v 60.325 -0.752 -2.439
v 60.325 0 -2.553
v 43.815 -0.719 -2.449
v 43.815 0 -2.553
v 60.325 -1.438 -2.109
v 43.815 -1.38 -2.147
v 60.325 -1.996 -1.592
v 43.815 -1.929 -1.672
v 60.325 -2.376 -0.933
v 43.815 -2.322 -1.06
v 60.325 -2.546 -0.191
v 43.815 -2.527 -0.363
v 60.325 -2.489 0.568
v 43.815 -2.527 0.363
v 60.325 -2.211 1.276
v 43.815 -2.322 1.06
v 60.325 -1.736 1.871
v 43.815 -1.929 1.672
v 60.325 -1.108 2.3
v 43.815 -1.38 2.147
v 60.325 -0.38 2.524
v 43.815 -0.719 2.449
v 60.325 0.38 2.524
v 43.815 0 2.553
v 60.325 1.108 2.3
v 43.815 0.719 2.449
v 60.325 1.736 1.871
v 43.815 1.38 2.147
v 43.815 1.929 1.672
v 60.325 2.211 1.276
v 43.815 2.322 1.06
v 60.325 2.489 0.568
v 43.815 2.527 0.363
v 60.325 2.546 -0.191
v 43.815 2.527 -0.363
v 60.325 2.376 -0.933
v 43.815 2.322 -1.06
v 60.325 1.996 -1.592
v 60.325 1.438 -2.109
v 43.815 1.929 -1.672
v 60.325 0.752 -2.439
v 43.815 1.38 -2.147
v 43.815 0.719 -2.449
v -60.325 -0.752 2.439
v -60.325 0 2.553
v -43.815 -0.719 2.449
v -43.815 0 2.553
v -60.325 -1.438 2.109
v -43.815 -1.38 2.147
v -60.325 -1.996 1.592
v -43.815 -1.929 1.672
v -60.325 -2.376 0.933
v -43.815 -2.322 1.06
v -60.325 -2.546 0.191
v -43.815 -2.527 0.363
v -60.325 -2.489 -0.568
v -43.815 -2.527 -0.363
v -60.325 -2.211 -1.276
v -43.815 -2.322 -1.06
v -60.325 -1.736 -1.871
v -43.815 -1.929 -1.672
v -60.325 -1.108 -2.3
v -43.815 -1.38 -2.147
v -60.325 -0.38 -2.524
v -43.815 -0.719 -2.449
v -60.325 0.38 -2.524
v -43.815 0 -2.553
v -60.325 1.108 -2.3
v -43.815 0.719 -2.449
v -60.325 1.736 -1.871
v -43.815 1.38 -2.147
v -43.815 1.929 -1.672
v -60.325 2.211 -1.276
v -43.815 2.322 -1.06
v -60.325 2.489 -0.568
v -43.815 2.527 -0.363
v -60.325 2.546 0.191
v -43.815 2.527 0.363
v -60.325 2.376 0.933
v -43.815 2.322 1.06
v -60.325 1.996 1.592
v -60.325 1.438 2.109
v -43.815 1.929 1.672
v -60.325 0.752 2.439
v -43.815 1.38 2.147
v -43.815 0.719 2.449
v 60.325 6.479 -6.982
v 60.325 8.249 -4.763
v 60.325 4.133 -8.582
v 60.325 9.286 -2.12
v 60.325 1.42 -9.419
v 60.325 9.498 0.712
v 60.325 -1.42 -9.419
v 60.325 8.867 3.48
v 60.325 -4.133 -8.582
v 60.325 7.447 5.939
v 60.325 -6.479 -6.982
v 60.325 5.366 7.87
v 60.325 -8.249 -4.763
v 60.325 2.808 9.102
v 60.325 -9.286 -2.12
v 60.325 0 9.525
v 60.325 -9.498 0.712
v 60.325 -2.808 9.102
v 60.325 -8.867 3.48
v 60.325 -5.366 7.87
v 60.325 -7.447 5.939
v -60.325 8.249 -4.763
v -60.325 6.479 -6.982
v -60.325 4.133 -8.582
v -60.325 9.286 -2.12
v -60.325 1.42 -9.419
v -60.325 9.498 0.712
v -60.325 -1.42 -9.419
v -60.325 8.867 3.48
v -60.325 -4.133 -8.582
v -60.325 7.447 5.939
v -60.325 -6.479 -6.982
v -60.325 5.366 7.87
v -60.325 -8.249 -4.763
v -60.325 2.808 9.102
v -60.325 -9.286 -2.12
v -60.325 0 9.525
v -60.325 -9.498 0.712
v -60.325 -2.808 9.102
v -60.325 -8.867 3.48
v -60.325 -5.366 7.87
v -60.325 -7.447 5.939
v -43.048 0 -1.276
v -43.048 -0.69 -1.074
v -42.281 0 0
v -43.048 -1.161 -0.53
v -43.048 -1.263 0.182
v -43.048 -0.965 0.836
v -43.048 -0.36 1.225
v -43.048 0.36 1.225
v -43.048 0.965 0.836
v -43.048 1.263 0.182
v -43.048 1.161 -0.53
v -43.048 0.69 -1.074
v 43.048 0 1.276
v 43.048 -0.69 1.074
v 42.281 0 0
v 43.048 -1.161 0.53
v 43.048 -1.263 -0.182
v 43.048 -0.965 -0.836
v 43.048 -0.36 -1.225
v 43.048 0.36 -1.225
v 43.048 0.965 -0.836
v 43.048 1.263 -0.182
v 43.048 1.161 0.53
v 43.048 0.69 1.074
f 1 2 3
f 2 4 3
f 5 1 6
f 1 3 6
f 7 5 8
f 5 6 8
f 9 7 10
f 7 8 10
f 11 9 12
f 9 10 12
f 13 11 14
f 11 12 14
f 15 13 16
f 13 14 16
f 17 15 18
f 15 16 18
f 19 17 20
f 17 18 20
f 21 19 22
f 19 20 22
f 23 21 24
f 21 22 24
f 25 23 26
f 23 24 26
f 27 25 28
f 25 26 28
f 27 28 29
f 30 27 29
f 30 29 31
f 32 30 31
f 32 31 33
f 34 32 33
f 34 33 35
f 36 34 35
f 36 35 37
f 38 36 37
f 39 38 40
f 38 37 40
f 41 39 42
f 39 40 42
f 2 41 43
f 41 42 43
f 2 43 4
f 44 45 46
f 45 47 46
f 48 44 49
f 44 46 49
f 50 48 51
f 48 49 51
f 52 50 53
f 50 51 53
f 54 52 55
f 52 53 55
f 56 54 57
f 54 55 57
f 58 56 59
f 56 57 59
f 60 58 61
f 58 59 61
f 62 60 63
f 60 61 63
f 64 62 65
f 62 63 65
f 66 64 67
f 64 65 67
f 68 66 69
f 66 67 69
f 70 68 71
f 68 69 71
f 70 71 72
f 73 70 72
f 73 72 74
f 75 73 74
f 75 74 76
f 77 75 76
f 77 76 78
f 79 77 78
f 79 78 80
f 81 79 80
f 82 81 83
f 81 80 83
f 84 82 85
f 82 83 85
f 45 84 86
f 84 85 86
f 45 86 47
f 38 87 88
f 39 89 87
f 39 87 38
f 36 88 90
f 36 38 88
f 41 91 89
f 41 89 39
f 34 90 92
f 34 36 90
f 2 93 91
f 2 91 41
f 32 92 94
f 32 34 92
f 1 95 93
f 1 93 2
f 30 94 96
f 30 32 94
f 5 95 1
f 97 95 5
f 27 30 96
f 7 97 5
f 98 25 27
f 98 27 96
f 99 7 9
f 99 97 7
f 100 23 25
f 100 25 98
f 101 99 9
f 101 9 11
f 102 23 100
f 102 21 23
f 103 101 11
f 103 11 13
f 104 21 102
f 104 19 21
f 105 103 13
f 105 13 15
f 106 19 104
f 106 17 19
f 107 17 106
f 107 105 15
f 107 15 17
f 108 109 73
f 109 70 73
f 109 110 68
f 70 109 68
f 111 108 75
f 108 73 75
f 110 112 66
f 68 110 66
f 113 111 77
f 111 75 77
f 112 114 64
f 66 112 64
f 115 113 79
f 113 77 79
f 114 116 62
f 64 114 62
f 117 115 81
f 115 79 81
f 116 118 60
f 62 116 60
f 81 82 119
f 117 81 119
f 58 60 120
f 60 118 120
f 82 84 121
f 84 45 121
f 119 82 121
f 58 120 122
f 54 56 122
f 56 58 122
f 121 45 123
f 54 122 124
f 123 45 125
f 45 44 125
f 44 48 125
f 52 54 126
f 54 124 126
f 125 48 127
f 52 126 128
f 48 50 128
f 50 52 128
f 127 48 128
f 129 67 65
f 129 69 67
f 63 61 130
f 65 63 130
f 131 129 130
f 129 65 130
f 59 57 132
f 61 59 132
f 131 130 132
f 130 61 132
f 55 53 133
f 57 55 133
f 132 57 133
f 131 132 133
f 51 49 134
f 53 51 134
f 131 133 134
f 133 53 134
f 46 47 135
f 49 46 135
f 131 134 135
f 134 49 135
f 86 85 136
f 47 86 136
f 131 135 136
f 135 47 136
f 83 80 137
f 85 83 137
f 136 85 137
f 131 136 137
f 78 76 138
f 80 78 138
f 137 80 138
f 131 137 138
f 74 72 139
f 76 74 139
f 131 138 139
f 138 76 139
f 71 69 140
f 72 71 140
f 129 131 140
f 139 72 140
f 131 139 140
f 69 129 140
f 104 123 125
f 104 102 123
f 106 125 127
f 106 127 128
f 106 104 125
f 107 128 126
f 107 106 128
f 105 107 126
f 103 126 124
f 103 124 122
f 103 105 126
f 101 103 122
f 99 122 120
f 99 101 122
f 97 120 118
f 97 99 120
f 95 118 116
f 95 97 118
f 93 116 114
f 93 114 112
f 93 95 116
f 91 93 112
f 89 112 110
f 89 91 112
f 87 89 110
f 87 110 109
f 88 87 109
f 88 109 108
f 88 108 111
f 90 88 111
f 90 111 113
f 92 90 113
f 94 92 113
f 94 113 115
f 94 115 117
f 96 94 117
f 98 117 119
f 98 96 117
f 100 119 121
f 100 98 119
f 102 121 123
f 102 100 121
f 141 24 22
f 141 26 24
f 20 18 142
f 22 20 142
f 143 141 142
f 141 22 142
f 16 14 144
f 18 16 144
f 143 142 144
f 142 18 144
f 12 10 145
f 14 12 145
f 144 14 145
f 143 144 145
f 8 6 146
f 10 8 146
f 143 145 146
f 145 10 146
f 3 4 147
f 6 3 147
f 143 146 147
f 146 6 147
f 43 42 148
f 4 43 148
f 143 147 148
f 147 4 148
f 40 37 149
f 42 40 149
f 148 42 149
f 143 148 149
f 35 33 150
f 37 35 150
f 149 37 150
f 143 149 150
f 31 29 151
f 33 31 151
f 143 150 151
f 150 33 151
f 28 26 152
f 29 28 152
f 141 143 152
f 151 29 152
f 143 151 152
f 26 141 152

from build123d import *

# Parameters (mm, degrees)
SKETCH1_R                             = 9.525
BOSS_EXTRUDE1_DEPTH                   = 60.325
F_1_4_20_TAPPED_HOLE1_D               = 5.1054
F_1_4_20_TAPPED_HOLE1_DEPTH           = 16.51
F_1_4_20_TAPPED_HOLE1_TIP             = 1.533816902
F_1_4_20_TAPPED_HOLE1_ON_FACE_2_D     = 5.1054
F_1_4_20_TAPPED_HOLE1_ON_FACE_2_DEPTH = 16.51
F_1_4_20_TAPPED_HOLE1_ON_FACE_2_TIP   = 1.533816902


with BuildPart() as part:
    # Sketch1 → Boss-Extrude1 (new, symmetric)
    with BuildSketch(Plane(origin=(0, 0, 0), x_dir=(0, 0, -1), z_dir=(1, 0, 0))):
        with Locations(Location((0, 0, 0), (0, 0, 180))):
            Circle(SKETCH1_R)
    extrude(amount=BOSS_EXTRUDE1_DEPTH, both=True)

    # 1/4-20 Tapped Hole1
    with Locations(Plane(origin=(60.325, 0, 0), x_dir=(0, 0, 1), z_dir=(1, 0, 0))):
        with Locations((0, 0)):
            Hole(F_1_4_20_TAPPED_HOLE1_D / 2, depth=F_1_4_20_TAPPED_HOLE1_DEPTH)
            with Locations((0, 0, -(F_1_4_20_TAPPED_HOLE1_DEPTH + F_1_4_20_TAPPED_HOLE1_TIP / 2))):  # 118° drill point
                Cone(0, F_1_4_20_TAPPED_HOLE1_D / 2, F_1_4_20_TAPPED_HOLE1_TIP, mode=Mode.SUBTRACT)

    # 1/4-20 Tapped Hole1 on face 2
    with Locations(Plane(origin=(-60.325, 0, 0), x_dir=(0, 0, -1), z_dir=(-1, 0, 0))):
        with Locations((0, 0)):
            Hole(F_1_4_20_TAPPED_HOLE1_ON_FACE_2_D / 2, depth=F_1_4_20_TAPPED_HOLE1_ON_FACE_2_DEPTH)
            with Locations((0, 0, -(F_1_4_20_TAPPED_HOLE1_ON_FACE_2_DEPTH + F_1_4_20_TAPPED_HOLE1_ON_FACE_2_TIP / 2))):  # 118° drill point
                Cone(0, F_1_4_20_TAPPED_HOLE1_ON_FACE_2_D / 2, F_1_4_20_TAPPED_HOLE1_ON_FACE_2_TIP, mode=Mode.SUBTRACT)


solid = part.part
